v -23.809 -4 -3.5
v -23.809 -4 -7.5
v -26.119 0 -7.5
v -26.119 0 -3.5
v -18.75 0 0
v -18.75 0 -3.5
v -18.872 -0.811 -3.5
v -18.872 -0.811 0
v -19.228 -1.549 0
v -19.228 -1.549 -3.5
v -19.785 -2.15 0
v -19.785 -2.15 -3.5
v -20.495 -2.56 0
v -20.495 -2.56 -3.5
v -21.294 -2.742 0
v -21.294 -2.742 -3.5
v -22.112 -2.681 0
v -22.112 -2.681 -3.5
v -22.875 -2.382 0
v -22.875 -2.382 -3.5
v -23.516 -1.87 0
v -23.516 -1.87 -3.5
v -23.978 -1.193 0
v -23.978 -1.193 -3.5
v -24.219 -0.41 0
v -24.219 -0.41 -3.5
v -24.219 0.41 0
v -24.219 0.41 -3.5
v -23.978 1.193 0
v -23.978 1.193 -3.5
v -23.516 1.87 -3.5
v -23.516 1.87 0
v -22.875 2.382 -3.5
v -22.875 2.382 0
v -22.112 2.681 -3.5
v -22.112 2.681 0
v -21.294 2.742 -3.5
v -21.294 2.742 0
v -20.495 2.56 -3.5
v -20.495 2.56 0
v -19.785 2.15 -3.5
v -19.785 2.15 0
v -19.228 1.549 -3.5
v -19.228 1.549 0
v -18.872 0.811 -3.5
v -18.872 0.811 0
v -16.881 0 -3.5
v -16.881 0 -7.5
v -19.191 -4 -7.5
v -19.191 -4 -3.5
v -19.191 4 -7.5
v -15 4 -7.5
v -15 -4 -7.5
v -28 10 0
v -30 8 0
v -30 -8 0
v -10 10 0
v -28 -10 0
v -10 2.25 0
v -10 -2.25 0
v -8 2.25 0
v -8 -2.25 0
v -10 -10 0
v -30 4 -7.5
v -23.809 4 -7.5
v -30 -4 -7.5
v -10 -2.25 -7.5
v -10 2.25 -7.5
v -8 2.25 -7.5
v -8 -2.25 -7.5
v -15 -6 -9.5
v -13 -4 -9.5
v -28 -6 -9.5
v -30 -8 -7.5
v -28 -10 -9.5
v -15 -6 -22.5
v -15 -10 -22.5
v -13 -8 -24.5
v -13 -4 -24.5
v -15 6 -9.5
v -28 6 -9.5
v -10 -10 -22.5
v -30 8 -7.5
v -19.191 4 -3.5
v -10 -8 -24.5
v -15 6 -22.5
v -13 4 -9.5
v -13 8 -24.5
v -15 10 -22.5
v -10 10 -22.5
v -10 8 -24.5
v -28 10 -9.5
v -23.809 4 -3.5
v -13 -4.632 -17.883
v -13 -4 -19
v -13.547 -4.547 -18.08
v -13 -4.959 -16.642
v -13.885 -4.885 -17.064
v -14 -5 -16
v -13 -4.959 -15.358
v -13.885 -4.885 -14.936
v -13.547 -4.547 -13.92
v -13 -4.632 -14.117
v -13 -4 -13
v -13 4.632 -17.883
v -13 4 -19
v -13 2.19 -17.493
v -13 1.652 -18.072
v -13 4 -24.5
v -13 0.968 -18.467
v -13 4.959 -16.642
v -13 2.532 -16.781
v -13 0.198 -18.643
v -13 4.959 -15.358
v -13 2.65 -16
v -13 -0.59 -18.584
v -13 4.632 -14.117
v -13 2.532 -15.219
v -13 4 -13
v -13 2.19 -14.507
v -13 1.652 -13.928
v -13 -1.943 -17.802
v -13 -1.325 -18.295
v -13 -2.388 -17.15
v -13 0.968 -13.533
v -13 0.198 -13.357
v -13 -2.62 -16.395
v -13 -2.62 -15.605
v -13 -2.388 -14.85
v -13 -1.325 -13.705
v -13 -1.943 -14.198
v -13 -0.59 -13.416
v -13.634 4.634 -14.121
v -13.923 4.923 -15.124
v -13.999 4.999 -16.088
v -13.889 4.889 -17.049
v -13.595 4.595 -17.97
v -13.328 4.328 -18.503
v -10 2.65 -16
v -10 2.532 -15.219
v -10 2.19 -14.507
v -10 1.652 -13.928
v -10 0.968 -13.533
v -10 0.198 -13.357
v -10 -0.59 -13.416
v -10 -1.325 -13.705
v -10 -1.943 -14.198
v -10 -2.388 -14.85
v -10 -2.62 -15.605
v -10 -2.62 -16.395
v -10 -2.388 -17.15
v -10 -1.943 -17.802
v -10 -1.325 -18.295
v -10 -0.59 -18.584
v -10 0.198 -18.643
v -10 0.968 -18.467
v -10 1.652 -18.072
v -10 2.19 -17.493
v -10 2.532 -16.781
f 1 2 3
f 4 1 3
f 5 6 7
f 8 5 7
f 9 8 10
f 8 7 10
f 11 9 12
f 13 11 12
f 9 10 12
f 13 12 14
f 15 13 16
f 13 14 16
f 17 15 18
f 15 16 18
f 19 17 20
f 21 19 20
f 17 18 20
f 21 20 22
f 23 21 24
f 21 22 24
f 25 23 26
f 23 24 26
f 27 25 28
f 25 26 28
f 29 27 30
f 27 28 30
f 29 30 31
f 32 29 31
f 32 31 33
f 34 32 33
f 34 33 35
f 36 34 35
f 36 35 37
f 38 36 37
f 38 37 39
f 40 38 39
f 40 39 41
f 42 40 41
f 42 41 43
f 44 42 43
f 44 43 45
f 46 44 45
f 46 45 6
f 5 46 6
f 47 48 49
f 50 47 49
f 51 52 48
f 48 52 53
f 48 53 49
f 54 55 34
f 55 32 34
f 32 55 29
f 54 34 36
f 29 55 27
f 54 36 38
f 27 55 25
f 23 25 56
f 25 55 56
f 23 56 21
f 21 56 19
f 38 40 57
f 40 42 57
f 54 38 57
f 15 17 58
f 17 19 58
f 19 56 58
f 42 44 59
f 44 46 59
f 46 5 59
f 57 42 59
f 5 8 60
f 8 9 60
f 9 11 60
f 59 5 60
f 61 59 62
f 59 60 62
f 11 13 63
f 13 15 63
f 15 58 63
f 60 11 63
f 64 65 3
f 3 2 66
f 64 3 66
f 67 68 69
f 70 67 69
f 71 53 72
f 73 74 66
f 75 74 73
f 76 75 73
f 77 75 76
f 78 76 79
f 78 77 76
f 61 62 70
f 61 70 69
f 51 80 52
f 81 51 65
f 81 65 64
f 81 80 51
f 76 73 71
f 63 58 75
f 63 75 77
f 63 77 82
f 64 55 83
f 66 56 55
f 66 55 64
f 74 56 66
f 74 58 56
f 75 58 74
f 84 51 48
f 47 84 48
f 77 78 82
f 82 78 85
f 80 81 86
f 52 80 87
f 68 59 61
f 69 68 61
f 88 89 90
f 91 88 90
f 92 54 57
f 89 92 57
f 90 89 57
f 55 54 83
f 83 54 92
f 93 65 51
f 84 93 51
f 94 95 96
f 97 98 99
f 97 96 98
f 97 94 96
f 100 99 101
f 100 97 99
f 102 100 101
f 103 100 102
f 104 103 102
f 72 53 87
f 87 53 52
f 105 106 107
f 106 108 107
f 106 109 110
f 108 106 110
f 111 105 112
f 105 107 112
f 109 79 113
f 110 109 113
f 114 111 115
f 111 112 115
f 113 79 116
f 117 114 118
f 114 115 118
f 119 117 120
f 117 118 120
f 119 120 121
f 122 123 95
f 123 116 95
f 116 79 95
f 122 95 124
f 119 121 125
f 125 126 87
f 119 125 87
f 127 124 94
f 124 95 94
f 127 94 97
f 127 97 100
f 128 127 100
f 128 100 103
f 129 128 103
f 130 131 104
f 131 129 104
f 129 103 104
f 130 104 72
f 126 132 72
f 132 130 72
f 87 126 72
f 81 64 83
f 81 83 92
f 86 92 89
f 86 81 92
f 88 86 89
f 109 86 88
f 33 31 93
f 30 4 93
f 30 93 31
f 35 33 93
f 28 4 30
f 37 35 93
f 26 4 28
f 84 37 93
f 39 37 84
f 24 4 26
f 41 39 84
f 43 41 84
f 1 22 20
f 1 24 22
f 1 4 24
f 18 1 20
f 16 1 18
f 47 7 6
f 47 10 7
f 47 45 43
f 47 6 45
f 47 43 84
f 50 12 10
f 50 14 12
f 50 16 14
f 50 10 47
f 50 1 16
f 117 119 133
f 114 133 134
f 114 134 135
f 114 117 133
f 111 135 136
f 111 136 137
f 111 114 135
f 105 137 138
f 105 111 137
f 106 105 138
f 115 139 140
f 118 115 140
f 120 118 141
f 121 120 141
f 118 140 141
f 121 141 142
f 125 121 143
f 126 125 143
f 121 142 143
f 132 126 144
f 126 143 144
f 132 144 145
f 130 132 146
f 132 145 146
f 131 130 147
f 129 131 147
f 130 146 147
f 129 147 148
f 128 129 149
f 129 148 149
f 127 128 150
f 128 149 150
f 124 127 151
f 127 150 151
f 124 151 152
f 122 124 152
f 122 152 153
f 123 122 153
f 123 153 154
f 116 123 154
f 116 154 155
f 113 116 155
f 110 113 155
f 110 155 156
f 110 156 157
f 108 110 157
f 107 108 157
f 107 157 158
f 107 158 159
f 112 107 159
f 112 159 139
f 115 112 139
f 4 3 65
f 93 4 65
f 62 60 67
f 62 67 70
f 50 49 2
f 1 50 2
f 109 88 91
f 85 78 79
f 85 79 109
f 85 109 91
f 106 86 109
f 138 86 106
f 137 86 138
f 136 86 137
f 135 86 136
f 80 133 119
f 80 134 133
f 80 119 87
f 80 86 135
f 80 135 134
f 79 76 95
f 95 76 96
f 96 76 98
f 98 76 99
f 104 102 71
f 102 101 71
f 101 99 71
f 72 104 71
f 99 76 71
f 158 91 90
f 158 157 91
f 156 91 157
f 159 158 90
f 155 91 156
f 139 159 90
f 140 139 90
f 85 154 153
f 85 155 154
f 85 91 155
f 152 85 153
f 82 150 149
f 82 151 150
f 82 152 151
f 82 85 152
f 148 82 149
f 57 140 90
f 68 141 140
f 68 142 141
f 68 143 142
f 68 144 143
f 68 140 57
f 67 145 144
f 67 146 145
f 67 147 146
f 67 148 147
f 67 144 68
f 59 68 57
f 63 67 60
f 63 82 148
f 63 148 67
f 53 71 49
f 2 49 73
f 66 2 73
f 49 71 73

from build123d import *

# Parameters (mm, degrees)
F0_W      = 2
F0_H      = 4.5
F1_DEPTH  = 7.5
F3_DEPTH  = 10
F5_DEPTH  = 6
F6_SIZE   = 2
F7_SIZE   = 2
F8_R      = 2.65
F9_DEPTH  = 25
F10_SIZE  = 2
F11_R     = 5
F12_DEPTH = 25
F13_W     = 22
F13_H     = 24.5
F14_DEPTH = 25
F16_DEPTH = 4
F17_R     = 2.75
F18_DEPTH = 25


with BuildPart() as f1:
    # F0 (on Top) → F1 (new body, symmetric)
    with BuildSketch(Plane.XY):
        with Locations((-9, 0)):
            Rectangle(F0_W, F0_H)
    extrude(amount=F1_DEPTH, both=True)

    # F2 (on Front) → F3 (join, symmetric)
    with BuildSketch(Plane.XZ):
        Polygon((-10, -24.5), (-10, 24.5), (-13, 24.5), (-30, 7.5), (-30, -7.5), (-13, -24.5), align=None)
    extrude(amount=F3_DEPTH, both=True)

    # F4 (on Front) → F5 (cut, symmetric)
    with BuildSketch(Plane.XZ):
        Polygon((-13, 7.5), (-13, 24.5), (-30, 7.5), align=None)
        Polygon((-13, -7.5), (-30, -7.5), (-13, -24.5), align=None)
    extrude(amount=F5_DEPTH, both=True, mode=Mode.SUBTRACT)

    # F6
    f6_edges = [f1.edges().sort_by_distance(p)[0] for p in [
        (-13, 6, -16),
        (-21.5, 6, -7.5),
        (-13, 0, -7.5),
        (-21.5, -6, -7.5),
        (-13, -6, -16),
        (-21.5, -6, 7.5),
        (-13, -6, 16),
        (-13, 6, 16),
        (-21.5, 6, 7.5),
        (-13, 0, 7.5),
    ]]
    chamfer(f6_edges, length=F6_SIZE)

    # F7
    f7_edges = [f1.edges().sort_by_distance(p)[0] for p in [
        (-30, -10, 0),
        (-30, 10, 0),
    ]]
    chamfer(f7_edges, length=F7_SIZE)

    # F8 (on face) → F9 (cut)
    with BuildSketch(Plane.YZ.offset(-10)):
        with Locations((0, -16)):
            Circle(F8_R)
        with Locations((0, 16)):
            Circle(F8_R)
    extrude(amount=-F9_DEPTH, mode=Mode.SUBTRACT)

    # F10
    f10_edges = [f1.edges().sort_by_distance(p)[0] for p in [
        (-11.5, 10, -24.5),
        (-11.5, -10, -24.5),
        (-11.5, 10, 24.5),
        (-11.5, -10, 24.5),
    ]]
    chamfer(f10_edges, length=F10_SIZE)

    # F11 (on face) → F12 (cut)
    with BuildSketch(Plane(origin=(-13, 0, 0), x_dir=(0, -1, 0), z_dir=(-1, 0, 0))):
        with Locations((0, 16)):
            Circle(F11_R)
        with Locations((0, -16)):
            Circle(F11_R)
    extrude(amount=F12_DEPTH, mode=Mode.SUBTRACT)

    # F13 (on face) → F14 (cut)
    with BuildSketch(Plane.XZ.offset(10)):
        with Locations((-19, 12.25)):
            Rectangle(F13_W, F13_H)
    extrude(amount=-F14_DEPTH, mode=Mode.SUBTRACT)

    # F15 (on face) → F16 (cut)
    with BuildSketch(Plane(origin=(0, 0, -7.5), x_dir=(1, 0, 0), z_dir=(0, 0, -1))):
        Polygon((-19.190599, 4), (-23.809401, 4), (-26.118802, 0), (-23.809401, -4), (-19.190599, -4), (-16.881198, 0), align=None)
    extrude(amount=-F16_DEPTH, mode=Mode.SUBTRACT)

    # F17 (on face) → F18 (cut)
    with BuildSketch(Plane(origin=(0, 0, -3.5), x_dir=(1, 0, 0), z_dir=(0, 0, -1))):
        with Locations((-21.5, 0)):
            Circle(F17_R)
    extrude(amount=-F18_DEPTH, mode=Mode.SUBTRACT)


solid = f1.part
